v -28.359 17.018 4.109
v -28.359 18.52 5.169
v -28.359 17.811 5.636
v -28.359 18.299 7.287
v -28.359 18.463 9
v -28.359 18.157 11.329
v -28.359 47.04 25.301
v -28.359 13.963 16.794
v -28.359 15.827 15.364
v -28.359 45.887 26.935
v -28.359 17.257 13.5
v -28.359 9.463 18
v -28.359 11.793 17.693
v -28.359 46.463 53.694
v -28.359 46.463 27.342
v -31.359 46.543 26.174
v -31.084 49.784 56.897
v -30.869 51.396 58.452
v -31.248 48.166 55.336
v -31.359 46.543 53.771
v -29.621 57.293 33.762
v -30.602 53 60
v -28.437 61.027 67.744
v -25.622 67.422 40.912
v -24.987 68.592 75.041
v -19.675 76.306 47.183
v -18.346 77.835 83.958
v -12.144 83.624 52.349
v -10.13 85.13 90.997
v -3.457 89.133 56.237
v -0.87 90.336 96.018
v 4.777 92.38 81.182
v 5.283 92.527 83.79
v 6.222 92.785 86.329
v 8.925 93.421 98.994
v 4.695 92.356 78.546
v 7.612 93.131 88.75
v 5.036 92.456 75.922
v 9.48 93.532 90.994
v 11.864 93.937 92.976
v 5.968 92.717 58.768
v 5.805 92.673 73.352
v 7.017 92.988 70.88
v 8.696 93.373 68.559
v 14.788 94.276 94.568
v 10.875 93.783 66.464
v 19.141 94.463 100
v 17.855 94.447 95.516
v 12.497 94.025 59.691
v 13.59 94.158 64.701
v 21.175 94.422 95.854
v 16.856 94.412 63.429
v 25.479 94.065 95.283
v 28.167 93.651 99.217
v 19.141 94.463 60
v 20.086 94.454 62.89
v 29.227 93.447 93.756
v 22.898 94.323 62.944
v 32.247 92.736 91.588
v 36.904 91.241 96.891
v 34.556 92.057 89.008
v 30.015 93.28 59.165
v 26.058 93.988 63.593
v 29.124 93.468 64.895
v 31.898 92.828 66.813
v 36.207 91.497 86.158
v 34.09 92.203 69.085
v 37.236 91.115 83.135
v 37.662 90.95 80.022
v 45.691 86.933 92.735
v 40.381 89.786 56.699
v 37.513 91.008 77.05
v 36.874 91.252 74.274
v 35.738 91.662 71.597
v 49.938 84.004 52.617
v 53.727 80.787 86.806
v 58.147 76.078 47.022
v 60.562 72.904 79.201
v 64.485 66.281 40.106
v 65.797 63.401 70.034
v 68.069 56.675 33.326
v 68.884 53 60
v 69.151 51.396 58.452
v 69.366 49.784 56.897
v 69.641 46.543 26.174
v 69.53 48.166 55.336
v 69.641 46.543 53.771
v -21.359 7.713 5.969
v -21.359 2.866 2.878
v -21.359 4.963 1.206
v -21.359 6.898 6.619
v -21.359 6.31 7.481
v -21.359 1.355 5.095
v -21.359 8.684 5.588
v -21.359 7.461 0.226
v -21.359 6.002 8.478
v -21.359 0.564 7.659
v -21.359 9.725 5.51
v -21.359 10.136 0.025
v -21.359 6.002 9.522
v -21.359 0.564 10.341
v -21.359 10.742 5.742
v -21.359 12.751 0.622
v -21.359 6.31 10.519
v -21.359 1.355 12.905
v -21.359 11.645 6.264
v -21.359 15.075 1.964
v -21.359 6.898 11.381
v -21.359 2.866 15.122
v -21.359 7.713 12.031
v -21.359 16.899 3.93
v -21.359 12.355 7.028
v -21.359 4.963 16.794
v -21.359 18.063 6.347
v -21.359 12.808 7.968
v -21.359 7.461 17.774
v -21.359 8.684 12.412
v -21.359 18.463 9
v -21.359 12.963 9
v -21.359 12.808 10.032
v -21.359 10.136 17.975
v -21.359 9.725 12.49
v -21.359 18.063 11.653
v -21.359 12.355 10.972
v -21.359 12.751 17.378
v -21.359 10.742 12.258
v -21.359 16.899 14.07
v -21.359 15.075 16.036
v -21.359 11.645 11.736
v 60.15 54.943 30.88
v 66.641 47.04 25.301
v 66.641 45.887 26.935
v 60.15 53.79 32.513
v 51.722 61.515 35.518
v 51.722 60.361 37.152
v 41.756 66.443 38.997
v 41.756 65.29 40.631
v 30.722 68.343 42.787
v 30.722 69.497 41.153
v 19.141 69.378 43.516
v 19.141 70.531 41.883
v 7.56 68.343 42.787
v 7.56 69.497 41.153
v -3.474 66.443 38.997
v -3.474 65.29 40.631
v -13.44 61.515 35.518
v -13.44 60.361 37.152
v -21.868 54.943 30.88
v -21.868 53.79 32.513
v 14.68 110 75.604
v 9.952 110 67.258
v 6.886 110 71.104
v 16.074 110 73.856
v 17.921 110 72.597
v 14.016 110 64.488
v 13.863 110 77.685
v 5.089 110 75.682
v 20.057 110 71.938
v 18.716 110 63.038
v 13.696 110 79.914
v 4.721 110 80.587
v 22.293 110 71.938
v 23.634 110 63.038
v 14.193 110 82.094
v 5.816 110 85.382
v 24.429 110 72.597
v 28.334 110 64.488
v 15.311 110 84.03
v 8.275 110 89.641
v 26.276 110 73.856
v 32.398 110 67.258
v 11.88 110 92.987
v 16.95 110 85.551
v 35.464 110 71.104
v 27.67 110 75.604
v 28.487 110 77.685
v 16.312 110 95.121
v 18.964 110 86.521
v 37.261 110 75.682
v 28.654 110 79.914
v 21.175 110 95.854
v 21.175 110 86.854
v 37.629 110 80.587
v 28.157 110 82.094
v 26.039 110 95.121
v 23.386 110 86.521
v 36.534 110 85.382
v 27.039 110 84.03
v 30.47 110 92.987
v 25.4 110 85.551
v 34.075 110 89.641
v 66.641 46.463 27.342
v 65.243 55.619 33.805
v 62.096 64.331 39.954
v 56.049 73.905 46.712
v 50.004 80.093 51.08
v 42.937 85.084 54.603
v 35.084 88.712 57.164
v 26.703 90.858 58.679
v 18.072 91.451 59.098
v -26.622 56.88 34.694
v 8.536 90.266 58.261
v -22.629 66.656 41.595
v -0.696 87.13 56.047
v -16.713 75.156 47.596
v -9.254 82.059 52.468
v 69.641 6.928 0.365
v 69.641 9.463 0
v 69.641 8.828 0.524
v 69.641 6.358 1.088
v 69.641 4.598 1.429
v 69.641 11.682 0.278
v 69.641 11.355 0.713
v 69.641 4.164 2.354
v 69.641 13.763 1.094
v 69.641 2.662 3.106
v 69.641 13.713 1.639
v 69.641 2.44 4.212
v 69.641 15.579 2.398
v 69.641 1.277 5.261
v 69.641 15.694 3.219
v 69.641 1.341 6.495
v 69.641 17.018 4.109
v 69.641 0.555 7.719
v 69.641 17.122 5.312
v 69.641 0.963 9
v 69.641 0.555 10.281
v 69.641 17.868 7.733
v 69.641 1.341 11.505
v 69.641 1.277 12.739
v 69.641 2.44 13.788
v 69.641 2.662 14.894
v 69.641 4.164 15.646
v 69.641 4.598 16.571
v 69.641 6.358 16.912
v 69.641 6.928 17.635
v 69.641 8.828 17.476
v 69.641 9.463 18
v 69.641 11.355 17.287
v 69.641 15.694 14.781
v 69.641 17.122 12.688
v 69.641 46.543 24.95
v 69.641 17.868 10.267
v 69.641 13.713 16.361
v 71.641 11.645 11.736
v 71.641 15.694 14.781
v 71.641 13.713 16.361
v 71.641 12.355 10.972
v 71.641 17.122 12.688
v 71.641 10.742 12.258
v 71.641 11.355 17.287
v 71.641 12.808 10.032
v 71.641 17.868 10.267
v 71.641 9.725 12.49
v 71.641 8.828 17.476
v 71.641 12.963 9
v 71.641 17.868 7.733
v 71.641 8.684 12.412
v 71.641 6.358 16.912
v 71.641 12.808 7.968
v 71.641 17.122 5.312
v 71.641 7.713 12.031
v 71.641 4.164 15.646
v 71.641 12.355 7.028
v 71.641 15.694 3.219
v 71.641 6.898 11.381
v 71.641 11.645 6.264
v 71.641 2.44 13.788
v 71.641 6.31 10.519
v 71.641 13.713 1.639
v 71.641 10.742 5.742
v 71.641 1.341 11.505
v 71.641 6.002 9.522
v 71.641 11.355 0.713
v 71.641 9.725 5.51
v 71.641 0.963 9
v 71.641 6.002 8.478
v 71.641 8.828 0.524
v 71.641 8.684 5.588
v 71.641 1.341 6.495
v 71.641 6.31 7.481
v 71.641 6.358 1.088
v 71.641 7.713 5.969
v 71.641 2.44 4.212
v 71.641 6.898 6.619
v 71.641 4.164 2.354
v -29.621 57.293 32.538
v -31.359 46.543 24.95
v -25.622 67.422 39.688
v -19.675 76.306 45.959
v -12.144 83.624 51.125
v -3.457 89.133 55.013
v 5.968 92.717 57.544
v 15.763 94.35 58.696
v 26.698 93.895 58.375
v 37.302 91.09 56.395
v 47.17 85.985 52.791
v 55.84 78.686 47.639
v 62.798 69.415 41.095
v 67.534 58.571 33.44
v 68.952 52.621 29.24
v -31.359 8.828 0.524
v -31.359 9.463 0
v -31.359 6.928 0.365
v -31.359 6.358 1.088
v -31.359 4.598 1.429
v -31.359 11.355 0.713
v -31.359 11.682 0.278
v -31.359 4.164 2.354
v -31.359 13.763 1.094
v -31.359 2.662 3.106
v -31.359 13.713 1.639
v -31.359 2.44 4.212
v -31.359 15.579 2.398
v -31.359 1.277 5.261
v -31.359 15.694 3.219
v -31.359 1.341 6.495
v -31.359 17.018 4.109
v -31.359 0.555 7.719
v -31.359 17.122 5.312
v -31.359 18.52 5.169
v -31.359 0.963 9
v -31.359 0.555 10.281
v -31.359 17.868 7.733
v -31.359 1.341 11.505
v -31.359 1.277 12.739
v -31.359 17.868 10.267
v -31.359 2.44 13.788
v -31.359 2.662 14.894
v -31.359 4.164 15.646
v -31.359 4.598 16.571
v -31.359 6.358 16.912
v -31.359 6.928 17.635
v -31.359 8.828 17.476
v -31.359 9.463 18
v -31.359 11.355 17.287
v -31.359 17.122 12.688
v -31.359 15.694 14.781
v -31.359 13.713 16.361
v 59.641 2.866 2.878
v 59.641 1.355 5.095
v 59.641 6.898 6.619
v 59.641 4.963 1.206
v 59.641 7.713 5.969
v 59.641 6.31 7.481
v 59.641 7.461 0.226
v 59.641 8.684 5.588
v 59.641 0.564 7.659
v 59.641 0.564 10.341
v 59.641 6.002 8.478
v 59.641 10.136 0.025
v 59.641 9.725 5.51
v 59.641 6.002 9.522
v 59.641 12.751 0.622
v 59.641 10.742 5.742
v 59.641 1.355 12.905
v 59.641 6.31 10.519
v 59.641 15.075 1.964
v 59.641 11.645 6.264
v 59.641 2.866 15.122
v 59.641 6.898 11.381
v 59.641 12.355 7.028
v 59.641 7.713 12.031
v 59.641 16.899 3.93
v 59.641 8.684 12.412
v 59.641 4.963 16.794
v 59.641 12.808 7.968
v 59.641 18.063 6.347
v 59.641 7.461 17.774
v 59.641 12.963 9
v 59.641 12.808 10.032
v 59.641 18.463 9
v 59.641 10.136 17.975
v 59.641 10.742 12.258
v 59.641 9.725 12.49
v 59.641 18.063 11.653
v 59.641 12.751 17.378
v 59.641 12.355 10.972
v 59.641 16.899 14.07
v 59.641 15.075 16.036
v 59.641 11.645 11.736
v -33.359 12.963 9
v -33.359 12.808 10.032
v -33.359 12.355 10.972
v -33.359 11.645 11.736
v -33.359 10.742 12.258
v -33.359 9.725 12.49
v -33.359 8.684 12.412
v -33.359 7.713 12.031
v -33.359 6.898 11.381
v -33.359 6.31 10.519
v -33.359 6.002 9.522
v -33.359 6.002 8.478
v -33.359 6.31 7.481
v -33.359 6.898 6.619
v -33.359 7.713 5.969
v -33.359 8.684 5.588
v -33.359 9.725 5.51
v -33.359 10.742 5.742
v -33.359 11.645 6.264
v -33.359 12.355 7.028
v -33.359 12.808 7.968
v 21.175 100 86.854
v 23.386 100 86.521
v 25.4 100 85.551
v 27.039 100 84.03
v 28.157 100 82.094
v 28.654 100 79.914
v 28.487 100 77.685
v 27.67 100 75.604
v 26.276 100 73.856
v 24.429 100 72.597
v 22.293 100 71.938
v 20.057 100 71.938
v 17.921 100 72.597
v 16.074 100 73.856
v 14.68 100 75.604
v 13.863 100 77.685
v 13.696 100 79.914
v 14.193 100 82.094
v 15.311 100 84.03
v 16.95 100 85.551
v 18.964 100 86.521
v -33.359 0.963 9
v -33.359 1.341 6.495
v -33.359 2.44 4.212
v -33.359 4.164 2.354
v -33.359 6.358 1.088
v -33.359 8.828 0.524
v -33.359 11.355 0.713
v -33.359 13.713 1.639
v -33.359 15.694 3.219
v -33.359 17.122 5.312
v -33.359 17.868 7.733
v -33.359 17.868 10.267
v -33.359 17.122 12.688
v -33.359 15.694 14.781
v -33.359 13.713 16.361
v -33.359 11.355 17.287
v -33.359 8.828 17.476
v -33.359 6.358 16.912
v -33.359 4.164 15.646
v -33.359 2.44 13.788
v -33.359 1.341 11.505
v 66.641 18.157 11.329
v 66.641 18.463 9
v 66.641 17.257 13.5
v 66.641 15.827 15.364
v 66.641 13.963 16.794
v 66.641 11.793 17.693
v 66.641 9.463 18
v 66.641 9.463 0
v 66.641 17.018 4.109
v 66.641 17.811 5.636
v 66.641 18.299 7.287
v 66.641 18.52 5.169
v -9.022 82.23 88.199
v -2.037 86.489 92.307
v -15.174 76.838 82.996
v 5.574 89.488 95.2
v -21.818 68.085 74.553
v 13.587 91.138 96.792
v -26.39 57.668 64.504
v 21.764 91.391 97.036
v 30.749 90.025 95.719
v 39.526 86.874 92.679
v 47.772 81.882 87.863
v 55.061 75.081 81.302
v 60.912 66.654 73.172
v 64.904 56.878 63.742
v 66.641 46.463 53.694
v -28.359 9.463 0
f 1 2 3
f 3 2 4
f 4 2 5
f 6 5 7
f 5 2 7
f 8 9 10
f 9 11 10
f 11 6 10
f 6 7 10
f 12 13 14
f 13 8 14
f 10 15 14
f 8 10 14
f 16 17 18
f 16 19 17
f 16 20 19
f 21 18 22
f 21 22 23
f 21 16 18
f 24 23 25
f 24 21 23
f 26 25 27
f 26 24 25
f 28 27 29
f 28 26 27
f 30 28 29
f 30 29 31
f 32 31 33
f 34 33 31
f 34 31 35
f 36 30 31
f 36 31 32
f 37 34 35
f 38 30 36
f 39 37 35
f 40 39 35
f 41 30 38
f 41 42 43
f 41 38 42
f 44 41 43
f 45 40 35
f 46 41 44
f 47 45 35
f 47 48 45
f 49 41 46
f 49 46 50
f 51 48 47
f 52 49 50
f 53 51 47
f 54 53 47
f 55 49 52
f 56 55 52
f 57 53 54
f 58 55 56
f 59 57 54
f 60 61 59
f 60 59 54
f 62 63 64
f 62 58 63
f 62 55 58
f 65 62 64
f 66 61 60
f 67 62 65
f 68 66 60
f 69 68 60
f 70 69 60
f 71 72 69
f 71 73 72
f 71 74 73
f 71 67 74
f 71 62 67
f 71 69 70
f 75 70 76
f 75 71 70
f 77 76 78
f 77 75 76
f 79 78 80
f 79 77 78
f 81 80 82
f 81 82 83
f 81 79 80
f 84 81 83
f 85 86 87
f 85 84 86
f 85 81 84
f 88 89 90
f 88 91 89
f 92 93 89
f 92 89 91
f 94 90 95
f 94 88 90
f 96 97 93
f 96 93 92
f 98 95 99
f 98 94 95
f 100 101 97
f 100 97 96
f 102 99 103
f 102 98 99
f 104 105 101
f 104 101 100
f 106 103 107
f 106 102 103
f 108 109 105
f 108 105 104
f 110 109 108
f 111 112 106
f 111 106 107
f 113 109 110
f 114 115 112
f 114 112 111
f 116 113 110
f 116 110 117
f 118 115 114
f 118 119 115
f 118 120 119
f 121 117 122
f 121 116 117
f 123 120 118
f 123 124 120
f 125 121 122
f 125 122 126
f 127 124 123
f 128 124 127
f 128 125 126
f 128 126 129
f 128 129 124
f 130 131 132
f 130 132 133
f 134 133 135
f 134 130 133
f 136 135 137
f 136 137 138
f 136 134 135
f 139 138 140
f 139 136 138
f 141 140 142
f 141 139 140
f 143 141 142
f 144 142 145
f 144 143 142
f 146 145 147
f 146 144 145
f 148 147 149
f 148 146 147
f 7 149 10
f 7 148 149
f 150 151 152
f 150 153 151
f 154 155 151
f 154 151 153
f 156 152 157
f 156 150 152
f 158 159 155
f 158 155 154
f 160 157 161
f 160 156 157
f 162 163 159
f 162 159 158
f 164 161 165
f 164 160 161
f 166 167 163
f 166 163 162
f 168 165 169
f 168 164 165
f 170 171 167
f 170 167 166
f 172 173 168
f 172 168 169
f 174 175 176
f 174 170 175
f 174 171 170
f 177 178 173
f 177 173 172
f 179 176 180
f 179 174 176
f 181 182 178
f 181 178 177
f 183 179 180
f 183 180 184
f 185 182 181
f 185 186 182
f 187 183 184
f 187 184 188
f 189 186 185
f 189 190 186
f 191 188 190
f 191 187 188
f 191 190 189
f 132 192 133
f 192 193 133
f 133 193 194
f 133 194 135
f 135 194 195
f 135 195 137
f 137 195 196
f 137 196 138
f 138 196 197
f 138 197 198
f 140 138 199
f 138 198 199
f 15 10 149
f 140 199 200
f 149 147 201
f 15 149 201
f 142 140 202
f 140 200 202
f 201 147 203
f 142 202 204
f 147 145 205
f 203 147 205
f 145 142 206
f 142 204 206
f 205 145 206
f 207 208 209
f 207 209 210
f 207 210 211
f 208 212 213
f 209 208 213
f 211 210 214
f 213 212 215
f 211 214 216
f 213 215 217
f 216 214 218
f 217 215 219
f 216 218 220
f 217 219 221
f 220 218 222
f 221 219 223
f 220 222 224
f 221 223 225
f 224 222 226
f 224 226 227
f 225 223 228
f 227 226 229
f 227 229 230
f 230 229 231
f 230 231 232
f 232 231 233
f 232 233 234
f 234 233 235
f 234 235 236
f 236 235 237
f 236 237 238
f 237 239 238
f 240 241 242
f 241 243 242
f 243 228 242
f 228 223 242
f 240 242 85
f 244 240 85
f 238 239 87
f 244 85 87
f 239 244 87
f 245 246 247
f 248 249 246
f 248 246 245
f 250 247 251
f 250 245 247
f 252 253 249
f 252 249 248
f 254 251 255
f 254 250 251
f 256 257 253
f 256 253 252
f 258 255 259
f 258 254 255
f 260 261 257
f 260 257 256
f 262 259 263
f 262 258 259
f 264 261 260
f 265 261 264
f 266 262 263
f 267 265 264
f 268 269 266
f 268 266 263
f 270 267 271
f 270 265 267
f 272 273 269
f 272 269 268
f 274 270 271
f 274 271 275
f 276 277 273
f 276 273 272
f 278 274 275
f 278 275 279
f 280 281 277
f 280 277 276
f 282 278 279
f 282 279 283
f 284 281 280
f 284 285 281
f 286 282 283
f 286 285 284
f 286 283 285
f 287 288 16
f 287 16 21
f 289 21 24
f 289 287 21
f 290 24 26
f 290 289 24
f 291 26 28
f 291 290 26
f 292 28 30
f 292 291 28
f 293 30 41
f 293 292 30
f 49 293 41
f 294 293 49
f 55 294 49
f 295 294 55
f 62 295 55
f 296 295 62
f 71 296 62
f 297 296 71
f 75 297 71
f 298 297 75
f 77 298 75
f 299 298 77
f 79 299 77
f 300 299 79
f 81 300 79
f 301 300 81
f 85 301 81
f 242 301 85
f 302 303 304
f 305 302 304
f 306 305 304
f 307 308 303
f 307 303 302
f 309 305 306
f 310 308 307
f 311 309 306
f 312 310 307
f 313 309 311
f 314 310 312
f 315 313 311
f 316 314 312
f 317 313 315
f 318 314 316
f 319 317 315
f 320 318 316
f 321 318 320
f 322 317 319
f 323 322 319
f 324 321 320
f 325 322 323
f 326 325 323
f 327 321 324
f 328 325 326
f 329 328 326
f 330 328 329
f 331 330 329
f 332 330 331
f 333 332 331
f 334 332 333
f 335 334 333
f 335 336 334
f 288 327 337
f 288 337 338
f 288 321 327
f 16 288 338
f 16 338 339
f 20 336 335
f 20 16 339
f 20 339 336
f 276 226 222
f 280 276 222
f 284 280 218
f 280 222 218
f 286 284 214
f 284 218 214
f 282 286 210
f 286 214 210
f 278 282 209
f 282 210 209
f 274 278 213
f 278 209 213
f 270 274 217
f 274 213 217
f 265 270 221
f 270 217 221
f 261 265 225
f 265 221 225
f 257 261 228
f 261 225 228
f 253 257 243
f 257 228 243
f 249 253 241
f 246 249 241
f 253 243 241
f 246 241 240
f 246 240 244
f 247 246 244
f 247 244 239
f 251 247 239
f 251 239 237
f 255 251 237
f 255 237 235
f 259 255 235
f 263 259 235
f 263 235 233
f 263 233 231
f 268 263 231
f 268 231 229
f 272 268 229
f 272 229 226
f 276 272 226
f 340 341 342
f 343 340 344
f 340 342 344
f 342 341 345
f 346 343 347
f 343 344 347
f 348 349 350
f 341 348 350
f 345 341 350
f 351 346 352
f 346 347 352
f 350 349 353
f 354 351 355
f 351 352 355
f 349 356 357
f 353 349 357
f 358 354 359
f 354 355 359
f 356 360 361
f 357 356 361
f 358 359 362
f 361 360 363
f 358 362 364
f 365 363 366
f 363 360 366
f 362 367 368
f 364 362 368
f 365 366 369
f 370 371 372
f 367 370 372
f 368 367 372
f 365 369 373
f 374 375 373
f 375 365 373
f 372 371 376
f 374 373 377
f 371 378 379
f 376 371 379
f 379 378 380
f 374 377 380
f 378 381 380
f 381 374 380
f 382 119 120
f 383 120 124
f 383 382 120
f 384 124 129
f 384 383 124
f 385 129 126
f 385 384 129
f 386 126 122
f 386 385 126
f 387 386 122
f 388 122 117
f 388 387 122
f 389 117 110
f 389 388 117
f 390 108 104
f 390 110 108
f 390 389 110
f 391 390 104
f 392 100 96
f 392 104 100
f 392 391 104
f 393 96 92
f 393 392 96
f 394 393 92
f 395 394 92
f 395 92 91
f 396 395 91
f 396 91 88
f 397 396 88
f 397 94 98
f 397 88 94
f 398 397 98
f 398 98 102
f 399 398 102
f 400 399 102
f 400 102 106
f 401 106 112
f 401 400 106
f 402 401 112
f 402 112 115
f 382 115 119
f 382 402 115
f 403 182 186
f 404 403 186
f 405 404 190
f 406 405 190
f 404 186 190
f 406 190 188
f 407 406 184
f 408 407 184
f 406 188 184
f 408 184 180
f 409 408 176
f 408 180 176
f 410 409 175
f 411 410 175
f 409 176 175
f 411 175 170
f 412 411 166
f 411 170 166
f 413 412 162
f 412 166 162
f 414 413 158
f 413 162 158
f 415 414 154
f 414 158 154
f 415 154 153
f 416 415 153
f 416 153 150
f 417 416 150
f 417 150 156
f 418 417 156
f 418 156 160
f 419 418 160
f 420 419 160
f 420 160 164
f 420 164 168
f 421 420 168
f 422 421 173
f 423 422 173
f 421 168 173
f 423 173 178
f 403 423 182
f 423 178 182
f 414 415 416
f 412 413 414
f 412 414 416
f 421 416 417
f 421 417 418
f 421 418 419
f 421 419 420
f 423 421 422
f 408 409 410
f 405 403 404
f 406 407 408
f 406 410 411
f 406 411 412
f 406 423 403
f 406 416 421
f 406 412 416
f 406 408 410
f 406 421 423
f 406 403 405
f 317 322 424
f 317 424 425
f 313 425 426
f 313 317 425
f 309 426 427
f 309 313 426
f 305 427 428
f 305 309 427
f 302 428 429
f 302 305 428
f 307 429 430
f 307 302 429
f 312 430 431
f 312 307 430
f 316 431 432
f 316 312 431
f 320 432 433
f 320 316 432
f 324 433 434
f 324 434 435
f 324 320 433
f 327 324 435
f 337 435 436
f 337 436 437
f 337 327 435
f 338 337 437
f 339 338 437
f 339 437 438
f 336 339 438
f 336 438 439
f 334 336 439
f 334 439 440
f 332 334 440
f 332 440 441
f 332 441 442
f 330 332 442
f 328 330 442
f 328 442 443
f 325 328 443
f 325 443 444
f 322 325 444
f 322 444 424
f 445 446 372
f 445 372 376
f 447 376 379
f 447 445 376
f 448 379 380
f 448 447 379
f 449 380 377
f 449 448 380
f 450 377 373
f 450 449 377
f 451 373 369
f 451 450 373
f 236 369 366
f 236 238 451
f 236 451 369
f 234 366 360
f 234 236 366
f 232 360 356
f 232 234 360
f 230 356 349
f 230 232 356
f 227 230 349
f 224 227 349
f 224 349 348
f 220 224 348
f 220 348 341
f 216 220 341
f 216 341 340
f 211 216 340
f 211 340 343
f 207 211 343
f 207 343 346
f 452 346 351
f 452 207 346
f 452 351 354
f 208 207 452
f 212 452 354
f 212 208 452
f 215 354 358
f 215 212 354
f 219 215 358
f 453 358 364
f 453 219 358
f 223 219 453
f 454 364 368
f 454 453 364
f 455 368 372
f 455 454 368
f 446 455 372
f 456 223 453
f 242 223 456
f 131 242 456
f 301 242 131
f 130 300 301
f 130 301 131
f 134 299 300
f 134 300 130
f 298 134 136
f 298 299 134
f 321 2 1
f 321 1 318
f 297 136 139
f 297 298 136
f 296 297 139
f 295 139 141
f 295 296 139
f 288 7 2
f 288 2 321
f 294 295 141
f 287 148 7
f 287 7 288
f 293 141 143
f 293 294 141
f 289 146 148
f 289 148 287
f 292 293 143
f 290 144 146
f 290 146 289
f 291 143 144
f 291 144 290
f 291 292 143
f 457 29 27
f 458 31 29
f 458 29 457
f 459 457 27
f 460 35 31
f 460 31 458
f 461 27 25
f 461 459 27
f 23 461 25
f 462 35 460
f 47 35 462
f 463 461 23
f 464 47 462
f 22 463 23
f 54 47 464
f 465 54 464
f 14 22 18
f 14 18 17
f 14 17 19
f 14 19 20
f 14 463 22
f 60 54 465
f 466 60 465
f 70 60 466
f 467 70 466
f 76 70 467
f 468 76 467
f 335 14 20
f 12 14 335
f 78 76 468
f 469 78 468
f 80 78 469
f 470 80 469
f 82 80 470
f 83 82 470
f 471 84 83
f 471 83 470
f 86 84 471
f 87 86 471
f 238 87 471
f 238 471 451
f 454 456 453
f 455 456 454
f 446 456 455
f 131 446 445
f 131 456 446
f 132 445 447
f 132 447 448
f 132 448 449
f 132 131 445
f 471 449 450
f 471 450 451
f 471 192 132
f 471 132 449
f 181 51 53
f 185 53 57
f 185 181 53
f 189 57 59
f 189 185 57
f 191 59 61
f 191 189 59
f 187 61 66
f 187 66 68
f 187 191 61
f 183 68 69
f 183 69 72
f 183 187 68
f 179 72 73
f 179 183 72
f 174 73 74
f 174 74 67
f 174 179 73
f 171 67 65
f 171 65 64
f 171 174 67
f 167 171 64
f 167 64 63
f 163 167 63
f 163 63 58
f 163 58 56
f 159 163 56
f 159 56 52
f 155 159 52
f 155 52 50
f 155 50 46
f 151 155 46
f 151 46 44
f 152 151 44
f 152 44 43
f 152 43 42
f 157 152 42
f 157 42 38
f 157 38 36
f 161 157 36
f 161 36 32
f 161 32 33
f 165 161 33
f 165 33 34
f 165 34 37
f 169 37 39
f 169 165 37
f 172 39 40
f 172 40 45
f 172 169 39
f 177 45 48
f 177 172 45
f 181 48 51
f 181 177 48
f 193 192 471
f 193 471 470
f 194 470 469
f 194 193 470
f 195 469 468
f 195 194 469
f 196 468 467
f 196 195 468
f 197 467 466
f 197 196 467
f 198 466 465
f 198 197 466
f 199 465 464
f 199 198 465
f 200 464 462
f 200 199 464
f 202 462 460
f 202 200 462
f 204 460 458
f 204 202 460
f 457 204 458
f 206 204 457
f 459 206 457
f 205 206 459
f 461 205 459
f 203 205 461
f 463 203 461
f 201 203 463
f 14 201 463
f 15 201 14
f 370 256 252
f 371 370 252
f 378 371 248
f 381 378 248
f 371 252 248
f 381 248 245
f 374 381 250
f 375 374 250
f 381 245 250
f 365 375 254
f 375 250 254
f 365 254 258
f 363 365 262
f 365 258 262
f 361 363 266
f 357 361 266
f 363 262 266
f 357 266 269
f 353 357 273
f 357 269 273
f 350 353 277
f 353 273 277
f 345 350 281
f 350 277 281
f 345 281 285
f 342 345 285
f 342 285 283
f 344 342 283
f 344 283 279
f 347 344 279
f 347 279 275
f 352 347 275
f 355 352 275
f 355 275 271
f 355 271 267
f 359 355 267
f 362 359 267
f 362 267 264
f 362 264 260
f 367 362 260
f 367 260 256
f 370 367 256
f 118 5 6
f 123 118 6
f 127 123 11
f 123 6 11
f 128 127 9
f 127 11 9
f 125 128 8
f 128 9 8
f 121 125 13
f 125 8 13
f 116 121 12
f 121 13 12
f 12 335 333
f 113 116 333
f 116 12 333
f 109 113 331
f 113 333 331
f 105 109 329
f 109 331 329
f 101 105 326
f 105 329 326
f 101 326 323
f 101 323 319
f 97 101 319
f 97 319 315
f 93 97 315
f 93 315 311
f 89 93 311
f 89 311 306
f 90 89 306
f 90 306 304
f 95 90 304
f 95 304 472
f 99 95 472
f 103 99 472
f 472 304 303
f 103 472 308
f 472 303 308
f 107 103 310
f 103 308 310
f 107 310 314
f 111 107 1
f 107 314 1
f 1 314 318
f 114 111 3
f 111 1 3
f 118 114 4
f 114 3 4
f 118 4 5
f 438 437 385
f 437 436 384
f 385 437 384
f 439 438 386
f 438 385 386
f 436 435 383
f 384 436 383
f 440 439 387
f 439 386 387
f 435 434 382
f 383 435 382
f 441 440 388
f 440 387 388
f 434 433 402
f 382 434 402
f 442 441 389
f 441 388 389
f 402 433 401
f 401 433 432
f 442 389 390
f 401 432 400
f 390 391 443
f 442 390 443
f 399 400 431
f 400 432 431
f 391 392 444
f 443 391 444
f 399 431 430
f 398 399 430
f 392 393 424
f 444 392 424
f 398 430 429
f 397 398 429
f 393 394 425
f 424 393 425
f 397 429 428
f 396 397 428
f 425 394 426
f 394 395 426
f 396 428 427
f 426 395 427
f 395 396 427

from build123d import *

# Parameters (mm, degrees)
SALIENTE_EXTRUIR1_DEPTH = 100
CORTAR_EXTRUIR1_DEPTH   = 141
CROQUIS3_R              = 9
SALIENTE_EXTRUIR2_DEPTH = 10
CROQUIS4_R              = 8.5
SALIENTE_EXTRUIR3_DEPTH = 2
CROQUIS5_R              = 3.5
CORTAR_EXTRUIR2_DEPTH   = 14
SALIENTE_EXTRUIR5_DEPTH = 1
SALIENTE_EXTRUIR7_REACH = 157.144
CROQUIS11_R             = 16.5
SALIENTE_EXTRUIR8_START = 15
CROQUIS12_R             = 16.5
SALIENTE_EXTRUIR8_DEPTH = 15
CROQUIS13_R             = 7.5
CORTAR_EXTRUIR5_DEPTH   = 10
CORTAR_EXTRUIR6_START   = 24.949967
CORTAR_EXTRUIR6_DEPTH   = 35.050033
SALIENTE_EXTRUIR9_REACH = 151.051
CROQUIS17_W             = 3
CROQUIS17_H             = 1


with BuildPart() as part:
    # Croquis1 → Saliente-Extruir1 (new body)
    with BuildSketch(Plane.XY):
        with BuildLine():
            Line((69.641072198, 46.543110775), (69.641072198, -23.536729858))
            Line((69.641072198, -23.536729858), (66.641072198, -23.536729858))
            Line((66.641072198, -23.536729858), (66.641072198, 46.463270142))
            ThreePointArc((66.641072198, 46.463270142), (19.141072198, 91.463270142), (-28.358927802, 46.463270142))
            Line((-28.358927802, 46.463270142), (-28.358927802, -23.536729858))
            Line((-28.358927802, -23.536729858), (-31.358927802, -23.536729858))
            Line((-31.358927802, -23.536729858), (-31.358927802, 46.543110775))
            ThreePointArc((-31.358927802, 46.543110775), (19.141072198, 94.463270142), (69.641072198, 46.543110775))
        make_face()
    extrude(amount=SALIENTE_EXTRUIR1_DEPTH)

    # Croquis2 → Cortar-Extruir1 (cut)
    with BuildSketch(Plane(origin=(69.641072198, 0, 0), x_dir=(0, 0, -1), z_dir=(1, 0, 0))):
        Polygon((-100, 94.463270142), (-18, 9.463270142), (0, 9.463270142), (-60, 94.463270142), (0, 94.463270142), (15.172467856, 86.125033525), (0, 6.963270142), (0, -23.536729858), (-100, -23.536729858), align=None)
    extrude(amount=-CORTAR_EXTRUIR1_DEPTH, mode=Mode.SUBTRACT)

    # Croquis3 → Saliente-Extruir2 (add)
    with BuildSketch(Plane(origin=(69.641072198, 0, 0), x_dir=(0, 0, -1), z_dir=(1, 0, 0))):
        with Locations(Location((-9, 9.463270142, 0), (0, 0, 90))):
            Circle(CROQUIS3_R)
    saliente_extruir2 = extrude(amount=-SALIENTE_EXTRUIR2_DEPTH)

    # Croquis4 → Saliente-Extruir3 (add)
    with BuildSketch(Plane(origin=(69.641072198, 0, 0), x_dir=(0, 0, -1), z_dir=(1, 0, 0))):
        with Locations(Location((-9, 9.463270142, 0), (0, 0, 270))):
            Circle(CROQUIS4_R)
    saliente_extruir3 = extrude(amount=SALIENTE_EXTRUIR3_DEPTH)

    # Croquis5 → Cortar-Extruir2 (cut)
    with BuildSketch(Plane(origin=(71.641072198, 0, 0), x_dir=(0, 0, -1), z_dir=(1, 0, 0))):
        with Locations(Location((-9, 9.463270142, 0), (0, 0, 90))):
            Circle(CROQUIS5_R)
    cortar_extruir2 = extrude(amount=-CORTAR_EXTRUIR2_DEPTH, mode=Mode.SUBTRACT)

    # Simetría1: Saliente-Extruir2, Saliente-Extruir3, Cortar-Extruir2 across plane
    add(saliente_extruir2.mirror(Plane(origin=(19.141072198, 0, 0), x_dir=(0, 0, 1), z_dir=(1, 0, 0))))
    add(saliente_extruir3.mirror(Plane(origin=(19.141072198, 0, 0), x_dir=(0, 0, 1), z_dir=(1, 0, 0))))
    add(cortar_extruir2.mirror(Plane(origin=(19.141072198, 0, 0), x_dir=(0, 0, 1), z_dir=(1, 0, 0))), mode=Mode.SUBTRACT)

    # Croquis6 → Saliente-Extruir5 (add, symmetric)
    with BuildSketch(Plane(origin=(0, 3.147138338, -4.458445979), x_dir=(-1, 0, 0), z_dir=(0, 0.5766831975986554, -0.8169678632647617))):
        with BuildLine():
            Line((-67.534417906, 18.111485144), (-66.641072198, 18.111485144))
            Line((-66.641072198, 18.111485144), (-66.641072198, 53.020606748))
            add(Edge.make_bspline(
                [(-19.141072198, 108.102332754), (-64.206861672, 108.102332754), (-66.641072198, 53.020606748)],
                knots=[3.141592654, 3.141592654, 3.141592654, 4.658348082, 4.658348082, 4.658348082], degree=2, weights=[1, 0.725952684, 1]))
            Line((-19.141072198, 108.102332754), (-19.141072198, 111.774447821))
            add(Edge.make_bspline(
                [(-19.141072198, 111.774447821), (-67.127128374, 111.774447821), (-69.641072198, 53.118334745)],
                knots=[3.141592654, 3.141592654, 3.141592654, 4.659975938, 4.659975938, 4.659975938], degree=2, weights=[1, 0.725392669, 1]))
            Line((-69.641072198, 53.118334745), (-69.641072198, 18.111485144))
            Line((-69.641072198, 18.111485144), (-67.534417906, 18.111485144))
        make_face()
        with BuildLine():
            Line((-19.141072198, 111.774447821), (-19.141072198, 108.102332754))
            add(Edge.make_bspline(
                [(28.358927802, 53.020606748), (25.924717276, 108.102332754), (-19.141072198, 108.102332754)],
                knots=[1.624837225, 1.624837225, 1.624837225, 3.141592654, 3.141592654, 3.141592654], degree=2, weights=[1, 0.725952684, 1]))
            Line((28.358927802, 53.020606748), (28.358927802, 18.111485144))
            Line((28.358927802, 18.111485144), (31.358927802, 18.111485144))
            Line((31.358927802, 18.111485144), (31.358927802, 53.118334745))
            add(Edge.make_bspline(
                [(31.358927802, 53.118334745), (28.844983978, 111.774447821), (-19.141072198, 111.774447821)],
                knots=[1.62320937, 1.62320937, 1.62320937, 3.141592654, 3.141592654, 3.141592654], degree=2, weights=[1, 0.725392669, 1]))
        make_face()
        with BuildLine():
            add(Edge.make_bspline(
                [(-19.141072198, 108.102332754), (-64.206861672, 108.102332754), (-66.641072198, 53.020606748)],
                knots=[3.141592654, 3.141592654, 3.141592654, 4.658348082, 4.658348082, 4.658348082], degree=2, weights=[1, 0.725952684, 1]))
            ThreePointArc((-66.641072198, 53.020606748), (-46.903607099, 74.026047186), (-19.141072198, 81.774447821))
            Line((-19.141072198, 81.774447821), (-19.141072198, 108.102332754))
        make_face()
        with BuildLine():
            Line((-19.141072198, 108.102332754), (-19.141072198, 81.774447821))
            ThreePointArc((-19.141072198, 81.774447821), (8.621462703, 74.026047186), (28.358927802, 53.020606748))
            add(Edge.make_bspline(
                [(28.358927802, 53.020606748), (25.924717276, 108.102332754), (-19.141072198, 108.102332754)],
                knots=[1.624837225, 1.624837225, 1.624837225, 3.141592654, 3.141592654, 3.141592654], degree=2, weights=[1, 0.725952684, 1]))
        make_face()
    extrude(amount=SALIENTE_EXTRUIR5_DEPTH, both=True)

    # Croquis11 → Saliente-Extruir7 (add, up to next)
    with BuildSketch(Plane(origin=(0, 95, 0), x_dir=(1, 0, 0), z_dir=(0, 1, 0)), mode=Mode.PRIVATE) as saliente_extruir7_sk1:
        with Locations(Location((21.175045512, -79.353799607, 0), (0, 0, 270))):
            Circle(CROQUIS11_R)
    saliente_extruir7_tool1 = extrude(saliente_extruir7_sk1.sketch, amount=-SALIENTE_EXTRUIR7_REACH, mode=Mode.PRIVATE) - part.part
    add(saliente_extruir7_tool1.solids().sort_by_distance((21.175046, 95, 79.3538))[0])

    # Croquis12 → Saliente-Extruir8 (add)
    with BuildSketch(Plane(origin=(0, 95, 0), x_dir=(1, 0, 0), z_dir=(0, 1, 0)).offset(SALIENTE_EXTRUIR8_START)):
        with Locations(Location((21.175045512, -79.353799607, 0), (0, 0, 270))):
            Circle(CROQUIS12_R)
    extrude(amount=-SALIENTE_EXTRUIR8_DEPTH)

    # Croquis13 → Cortar-Extruir5 (cut)
    with BuildSketch(Plane(origin=(0, 110, 0), x_dir=(1, 0, 0), z_dir=(0, 1, 0))):
        with Locations(Location((21.175045512, -79.353799607, 0), (0, 0, 270))):
            Circle(CROQUIS13_R)
    extrude(amount=-CORTAR_EXTRUIR5_DEPTH, mode=Mode.SUBTRACT)

    # Croquis8 → Cortar-Extruir6 (cut)
    with BuildSketch(Plane.XY.offset(CORTAR_EXTRUIR6_START)):
        with BuildLine():
            Line((-31.358927802, 46.543110775), (-43.995227874, 50.405646303))
            Line((-43.995227874, 50.405646303), (-32.93588468, 104.800400399))
            Line((-32.93588468, 104.800400399), (86.326861303, 97.464379117))
            Line((86.326861303, 97.464379117), (84.859657046, 44.645025888))
            Line((84.859657046, 44.645025888), (69.641072198, 46.543110775))
            ThreePointArc((69.641072198, 46.543110775), (19.141072198, 94.463270142), (-31.358927802, 46.543110775))
        make_face()
    extrude(amount=CORTAR_EXTRUIR6_DEPTH, mode=Mode.SUBTRACT)

    # Croquis17 → Saliente-Extruir9 (add, up to next)
    with BuildSketch(Plane(origin=(0, 14.796501319, 10.444589166), x_dir=(1, 0, 0), z_dir=(0, -0.8169678632647617, -0.5766831975986554)), mode=Mode.PRIVATE) as saliente_extruir9_sk1:
        with Locations((-29.858927802, -5.957308885)):
            Rectangle(CROQUIS17_W, CROQUIS17_H)
    saliente_extruir9_tool1 = extrude(saliente_extruir9_sk1.sketch, amount=SALIENTE_EXTRUIR9_REACH, mode=Mode.PRIVATE) - part.part
    saliente_extruir9 = saliente_extruir9_tool1.solids().sort_by_distance((-29.858928, 18.231981, 5.577659))[0]
    add(saliente_extruir9)

    # Simetría2: Saliente-Extruir9 across plane
    add(saliente_extruir9.mirror(Plane(origin=(19.141072198, 0, 0), x_dir=(0, 0, 1), z_dir=(1, 0, 0))))


solid = part.part
